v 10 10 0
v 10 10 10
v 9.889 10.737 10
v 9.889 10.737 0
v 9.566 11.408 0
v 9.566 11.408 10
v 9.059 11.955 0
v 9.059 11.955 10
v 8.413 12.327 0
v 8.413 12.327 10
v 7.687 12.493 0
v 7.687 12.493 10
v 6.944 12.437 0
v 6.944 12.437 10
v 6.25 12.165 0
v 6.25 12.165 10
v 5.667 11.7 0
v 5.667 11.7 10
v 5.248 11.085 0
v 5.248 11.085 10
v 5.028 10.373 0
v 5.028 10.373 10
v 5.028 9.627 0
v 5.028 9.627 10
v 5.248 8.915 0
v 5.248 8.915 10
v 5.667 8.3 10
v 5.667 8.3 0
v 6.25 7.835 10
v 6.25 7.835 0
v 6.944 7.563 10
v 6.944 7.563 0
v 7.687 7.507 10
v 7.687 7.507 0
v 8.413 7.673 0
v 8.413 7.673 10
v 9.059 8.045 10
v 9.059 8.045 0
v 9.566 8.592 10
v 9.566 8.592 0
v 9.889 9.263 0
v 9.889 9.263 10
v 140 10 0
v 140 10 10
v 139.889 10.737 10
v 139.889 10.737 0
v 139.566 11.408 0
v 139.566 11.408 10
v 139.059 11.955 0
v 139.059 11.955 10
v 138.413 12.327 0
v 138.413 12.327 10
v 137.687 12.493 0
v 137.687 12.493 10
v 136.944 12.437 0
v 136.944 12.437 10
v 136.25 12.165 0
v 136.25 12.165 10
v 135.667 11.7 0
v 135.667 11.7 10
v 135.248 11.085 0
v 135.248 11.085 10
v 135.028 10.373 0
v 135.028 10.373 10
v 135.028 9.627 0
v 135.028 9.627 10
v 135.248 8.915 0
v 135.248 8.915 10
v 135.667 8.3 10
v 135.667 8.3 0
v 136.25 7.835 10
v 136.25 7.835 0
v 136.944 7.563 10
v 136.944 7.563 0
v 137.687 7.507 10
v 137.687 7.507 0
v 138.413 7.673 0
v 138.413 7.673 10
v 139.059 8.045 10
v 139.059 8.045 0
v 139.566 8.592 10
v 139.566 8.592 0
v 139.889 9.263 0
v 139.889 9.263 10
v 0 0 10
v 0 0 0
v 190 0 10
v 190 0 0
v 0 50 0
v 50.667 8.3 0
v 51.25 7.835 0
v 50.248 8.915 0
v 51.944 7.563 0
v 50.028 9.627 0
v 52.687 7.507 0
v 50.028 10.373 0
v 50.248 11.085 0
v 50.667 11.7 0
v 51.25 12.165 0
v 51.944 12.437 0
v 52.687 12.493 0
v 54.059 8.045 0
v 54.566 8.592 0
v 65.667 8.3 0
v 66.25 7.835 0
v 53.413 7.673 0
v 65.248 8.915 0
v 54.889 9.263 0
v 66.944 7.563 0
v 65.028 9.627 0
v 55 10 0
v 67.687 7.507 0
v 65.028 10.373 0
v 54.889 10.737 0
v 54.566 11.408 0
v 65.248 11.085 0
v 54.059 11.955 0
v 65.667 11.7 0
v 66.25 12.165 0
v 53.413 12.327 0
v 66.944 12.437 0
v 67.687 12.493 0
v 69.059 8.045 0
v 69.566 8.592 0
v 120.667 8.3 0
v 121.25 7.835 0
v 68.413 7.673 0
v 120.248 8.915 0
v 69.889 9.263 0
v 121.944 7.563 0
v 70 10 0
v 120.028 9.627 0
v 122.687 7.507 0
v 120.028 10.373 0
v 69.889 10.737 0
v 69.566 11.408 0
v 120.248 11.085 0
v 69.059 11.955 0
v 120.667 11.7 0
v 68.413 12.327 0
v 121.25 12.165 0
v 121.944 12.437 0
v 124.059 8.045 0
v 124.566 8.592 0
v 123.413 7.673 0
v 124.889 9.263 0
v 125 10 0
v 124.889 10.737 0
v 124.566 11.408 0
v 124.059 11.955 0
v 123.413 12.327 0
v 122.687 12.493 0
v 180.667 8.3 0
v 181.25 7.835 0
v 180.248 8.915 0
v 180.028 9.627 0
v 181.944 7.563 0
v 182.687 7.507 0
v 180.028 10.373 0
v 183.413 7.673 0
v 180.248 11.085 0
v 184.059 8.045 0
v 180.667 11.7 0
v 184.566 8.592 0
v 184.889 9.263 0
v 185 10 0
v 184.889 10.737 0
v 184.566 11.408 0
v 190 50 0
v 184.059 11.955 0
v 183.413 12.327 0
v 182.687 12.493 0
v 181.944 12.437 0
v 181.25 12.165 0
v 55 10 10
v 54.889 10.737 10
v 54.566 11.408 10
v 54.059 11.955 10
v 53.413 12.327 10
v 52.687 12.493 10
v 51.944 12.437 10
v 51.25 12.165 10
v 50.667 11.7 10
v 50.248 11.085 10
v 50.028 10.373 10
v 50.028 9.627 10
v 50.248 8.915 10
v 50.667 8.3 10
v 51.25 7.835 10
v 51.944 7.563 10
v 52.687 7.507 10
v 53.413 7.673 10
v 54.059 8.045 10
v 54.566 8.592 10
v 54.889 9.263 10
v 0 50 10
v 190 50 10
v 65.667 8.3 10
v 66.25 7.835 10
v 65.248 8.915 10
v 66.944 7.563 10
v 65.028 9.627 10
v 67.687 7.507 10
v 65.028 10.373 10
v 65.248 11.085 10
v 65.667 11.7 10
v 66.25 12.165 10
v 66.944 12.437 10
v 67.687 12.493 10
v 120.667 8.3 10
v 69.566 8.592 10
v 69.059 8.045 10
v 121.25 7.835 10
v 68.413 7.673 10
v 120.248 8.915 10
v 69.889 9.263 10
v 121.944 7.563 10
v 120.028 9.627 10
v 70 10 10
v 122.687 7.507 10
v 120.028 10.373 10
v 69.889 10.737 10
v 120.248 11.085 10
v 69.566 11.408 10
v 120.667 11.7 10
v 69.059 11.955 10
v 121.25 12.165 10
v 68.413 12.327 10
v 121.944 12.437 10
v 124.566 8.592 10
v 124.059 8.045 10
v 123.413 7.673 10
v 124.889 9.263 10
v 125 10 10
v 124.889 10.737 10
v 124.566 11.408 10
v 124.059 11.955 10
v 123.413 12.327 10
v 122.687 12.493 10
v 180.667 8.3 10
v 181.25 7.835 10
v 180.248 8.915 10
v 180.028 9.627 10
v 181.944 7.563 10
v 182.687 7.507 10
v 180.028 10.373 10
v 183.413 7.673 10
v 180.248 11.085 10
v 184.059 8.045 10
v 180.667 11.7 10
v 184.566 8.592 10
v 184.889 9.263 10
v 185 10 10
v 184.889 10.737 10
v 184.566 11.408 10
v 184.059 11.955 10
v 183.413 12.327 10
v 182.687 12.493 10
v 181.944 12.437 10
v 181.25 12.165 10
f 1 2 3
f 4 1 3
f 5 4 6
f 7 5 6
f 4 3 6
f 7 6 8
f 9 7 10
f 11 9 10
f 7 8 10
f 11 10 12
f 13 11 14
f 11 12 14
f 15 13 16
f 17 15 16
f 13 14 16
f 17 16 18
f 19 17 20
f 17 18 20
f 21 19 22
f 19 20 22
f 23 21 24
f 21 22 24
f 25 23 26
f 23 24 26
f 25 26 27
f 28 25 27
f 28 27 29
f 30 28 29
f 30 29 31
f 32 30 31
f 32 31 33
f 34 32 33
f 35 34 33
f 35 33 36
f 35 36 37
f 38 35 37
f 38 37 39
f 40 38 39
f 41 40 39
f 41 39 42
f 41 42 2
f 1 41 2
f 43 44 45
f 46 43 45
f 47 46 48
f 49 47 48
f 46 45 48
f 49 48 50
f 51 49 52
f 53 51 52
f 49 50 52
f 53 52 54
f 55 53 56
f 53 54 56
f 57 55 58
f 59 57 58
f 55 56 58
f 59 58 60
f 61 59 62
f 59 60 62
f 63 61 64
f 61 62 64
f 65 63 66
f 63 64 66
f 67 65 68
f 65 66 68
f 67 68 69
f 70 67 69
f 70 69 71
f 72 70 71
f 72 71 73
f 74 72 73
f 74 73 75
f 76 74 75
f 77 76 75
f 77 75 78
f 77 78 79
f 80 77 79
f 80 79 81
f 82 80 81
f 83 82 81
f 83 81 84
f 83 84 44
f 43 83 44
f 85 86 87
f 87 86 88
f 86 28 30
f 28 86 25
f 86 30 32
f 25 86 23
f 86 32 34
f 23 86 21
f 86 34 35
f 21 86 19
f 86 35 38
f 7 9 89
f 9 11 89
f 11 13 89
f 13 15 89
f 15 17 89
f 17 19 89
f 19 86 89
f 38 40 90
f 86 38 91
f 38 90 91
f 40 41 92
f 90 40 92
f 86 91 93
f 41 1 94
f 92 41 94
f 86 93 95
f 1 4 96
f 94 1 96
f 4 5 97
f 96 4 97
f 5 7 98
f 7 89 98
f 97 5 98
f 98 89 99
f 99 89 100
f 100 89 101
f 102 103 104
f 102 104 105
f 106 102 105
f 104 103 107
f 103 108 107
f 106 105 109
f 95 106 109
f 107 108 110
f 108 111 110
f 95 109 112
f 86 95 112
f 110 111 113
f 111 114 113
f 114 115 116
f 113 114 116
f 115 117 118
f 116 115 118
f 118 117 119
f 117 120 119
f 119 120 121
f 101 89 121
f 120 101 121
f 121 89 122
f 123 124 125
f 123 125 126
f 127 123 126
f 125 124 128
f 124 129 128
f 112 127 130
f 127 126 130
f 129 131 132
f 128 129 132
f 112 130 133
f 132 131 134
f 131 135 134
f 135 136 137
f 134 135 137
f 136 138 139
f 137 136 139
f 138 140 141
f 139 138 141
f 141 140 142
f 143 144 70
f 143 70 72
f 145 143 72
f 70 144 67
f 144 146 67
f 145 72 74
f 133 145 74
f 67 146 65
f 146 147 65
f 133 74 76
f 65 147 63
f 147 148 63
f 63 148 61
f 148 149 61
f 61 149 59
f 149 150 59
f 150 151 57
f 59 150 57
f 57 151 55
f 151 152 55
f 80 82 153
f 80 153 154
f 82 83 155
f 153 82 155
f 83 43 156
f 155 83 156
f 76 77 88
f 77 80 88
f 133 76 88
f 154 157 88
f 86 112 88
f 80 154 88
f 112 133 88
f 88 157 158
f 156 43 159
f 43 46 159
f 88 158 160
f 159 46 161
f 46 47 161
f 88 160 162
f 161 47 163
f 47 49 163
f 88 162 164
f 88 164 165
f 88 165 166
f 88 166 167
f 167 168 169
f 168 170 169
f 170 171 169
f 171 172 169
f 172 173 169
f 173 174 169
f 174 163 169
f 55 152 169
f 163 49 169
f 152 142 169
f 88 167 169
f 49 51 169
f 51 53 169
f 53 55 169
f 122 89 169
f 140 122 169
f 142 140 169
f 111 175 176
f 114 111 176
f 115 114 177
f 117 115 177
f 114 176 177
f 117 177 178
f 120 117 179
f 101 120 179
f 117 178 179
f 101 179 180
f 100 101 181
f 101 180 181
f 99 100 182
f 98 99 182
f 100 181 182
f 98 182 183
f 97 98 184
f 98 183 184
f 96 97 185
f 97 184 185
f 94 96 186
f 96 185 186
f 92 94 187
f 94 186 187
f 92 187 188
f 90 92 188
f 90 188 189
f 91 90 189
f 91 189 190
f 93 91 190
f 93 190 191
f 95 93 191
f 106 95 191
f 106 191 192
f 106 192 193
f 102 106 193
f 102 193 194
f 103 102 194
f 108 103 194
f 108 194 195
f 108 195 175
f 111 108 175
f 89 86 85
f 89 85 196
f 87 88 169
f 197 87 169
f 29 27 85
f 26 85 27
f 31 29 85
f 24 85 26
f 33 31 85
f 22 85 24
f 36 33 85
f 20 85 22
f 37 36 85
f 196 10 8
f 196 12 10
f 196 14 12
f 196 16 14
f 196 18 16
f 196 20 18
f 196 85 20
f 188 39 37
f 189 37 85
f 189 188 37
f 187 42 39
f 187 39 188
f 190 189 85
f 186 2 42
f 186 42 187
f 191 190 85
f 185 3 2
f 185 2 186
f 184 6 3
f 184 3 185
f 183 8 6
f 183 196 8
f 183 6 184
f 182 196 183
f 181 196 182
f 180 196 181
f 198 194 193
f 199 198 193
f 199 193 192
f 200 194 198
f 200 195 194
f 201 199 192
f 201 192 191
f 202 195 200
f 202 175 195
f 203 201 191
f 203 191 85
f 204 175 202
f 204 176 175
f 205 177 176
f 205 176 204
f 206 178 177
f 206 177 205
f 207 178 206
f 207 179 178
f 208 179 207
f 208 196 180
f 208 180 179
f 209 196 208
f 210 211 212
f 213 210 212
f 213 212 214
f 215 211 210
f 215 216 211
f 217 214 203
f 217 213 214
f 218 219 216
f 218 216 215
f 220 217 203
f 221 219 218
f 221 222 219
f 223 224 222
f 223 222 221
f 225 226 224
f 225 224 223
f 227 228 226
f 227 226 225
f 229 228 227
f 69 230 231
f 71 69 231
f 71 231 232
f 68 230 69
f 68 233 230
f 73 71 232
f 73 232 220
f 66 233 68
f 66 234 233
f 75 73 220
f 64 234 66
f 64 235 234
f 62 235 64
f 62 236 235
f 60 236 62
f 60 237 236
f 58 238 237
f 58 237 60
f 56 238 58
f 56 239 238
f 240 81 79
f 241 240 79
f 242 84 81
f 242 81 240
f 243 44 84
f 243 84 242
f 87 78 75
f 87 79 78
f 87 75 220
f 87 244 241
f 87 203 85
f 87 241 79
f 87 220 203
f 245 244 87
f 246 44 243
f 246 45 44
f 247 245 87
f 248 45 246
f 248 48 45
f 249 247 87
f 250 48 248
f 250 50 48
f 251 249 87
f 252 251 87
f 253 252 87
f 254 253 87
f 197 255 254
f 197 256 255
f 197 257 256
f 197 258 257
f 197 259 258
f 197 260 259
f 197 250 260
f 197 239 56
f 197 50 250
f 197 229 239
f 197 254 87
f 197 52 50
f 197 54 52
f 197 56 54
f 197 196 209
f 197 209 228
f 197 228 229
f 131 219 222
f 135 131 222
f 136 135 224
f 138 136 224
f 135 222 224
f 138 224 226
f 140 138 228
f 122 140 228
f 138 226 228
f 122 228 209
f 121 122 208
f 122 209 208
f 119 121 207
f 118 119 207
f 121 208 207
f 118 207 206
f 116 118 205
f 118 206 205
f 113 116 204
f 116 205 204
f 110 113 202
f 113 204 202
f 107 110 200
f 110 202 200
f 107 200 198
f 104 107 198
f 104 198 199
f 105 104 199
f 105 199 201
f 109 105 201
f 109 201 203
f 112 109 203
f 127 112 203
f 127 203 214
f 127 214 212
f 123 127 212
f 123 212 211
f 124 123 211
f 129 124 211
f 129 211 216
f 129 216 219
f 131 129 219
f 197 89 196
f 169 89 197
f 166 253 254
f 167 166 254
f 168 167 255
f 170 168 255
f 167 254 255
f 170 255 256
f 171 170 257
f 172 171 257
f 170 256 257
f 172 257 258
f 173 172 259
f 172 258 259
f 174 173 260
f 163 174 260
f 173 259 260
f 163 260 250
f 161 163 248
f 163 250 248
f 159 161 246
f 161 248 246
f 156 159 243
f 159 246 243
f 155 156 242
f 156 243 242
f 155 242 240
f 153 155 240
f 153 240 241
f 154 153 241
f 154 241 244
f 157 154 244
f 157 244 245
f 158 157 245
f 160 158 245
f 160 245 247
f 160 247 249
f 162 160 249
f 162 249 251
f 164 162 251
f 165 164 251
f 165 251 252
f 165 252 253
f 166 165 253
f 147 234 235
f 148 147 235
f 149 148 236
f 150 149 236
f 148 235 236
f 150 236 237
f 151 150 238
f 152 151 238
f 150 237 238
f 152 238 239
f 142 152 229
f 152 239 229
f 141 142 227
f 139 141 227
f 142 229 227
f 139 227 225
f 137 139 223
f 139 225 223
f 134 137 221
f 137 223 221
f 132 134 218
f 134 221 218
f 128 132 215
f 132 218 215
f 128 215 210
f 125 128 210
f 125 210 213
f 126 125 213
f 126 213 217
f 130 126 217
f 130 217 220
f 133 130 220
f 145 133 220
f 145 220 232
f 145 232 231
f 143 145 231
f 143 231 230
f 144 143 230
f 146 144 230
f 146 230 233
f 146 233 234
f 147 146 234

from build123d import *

# Parameters (mm, degrees)
SKETCH_W               = 190
SKETCH_H               = 50
PAD_DEPTH              = 10
SKETCH001_R            = 2.5
HOLE_DEPTH             = 10.001
LINEARPATTERN_COUNT    = 2
LINEARPATTERN_PITCH    = 45
LINEARPATTERN001_COUNT = 2
LINEARPATTERN001_PITCH = 60
LINEARPATTERN002_COUNT = 2
LINEARPATTERN002_PITCH = 115
LINEARPATTERN003_COUNT = 2
LINEARPATTERN003_PITCH = 130
LINEARPATTERN004_COUNT = 2
LINEARPATTERN004_PITCH = 175


with BuildPart() as part:
    # Sketch → Pad (new body)
    with BuildSketch(Plane.XY):
        with Locations((95, 25)):
            Rectangle(SKETCH_W, SKETCH_H)
    extrude(amount=PAD_DEPTH)

    # Sketch001 (on Face6 of Pad) → Hole (cut, through all)
    with BuildSketch(Plane.XY.offset(10)):
        with Locations((7.5, 10)):
            Circle(SKETCH001_R)
    hole = extrude(amount=-HOLE_DEPTH, mode=Mode.SUBTRACT)

    # LinearPattern: Hole ×2
    with Locations(*[(i * LINEARPATTERN_PITCH, 0, 0) for i in range(1, LINEARPATTERN_COUNT)]):
        add(hole, mode=Mode.SUBTRACT)

    # LinearPattern001: Hole ×2
    with Locations(*[(i * LINEARPATTERN001_PITCH, 0, 0) for i in range(1, LINEARPATTERN001_COUNT)]):
        add(hole, mode=Mode.SUBTRACT)

    # LinearPattern002: Hole ×2
    with Locations(*[(i * LINEARPATTERN002_PITCH, 0, 0) for i in range(1, LINEARPATTERN002_COUNT)]):
        add(hole, mode=Mode.SUBTRACT)

    # LinearPattern003: Hole ×2
    with Locations(*[(i * LINEARPATTERN003_PITCH, 0, 0) for i in range(1, LINEARPATTERN003_COUNT)]):
        add(hole, mode=Mode.SUBTRACT)

    # LinearPattern004: Hole ×2
    with Locations(*[(i * LINEARPATTERN004_PITCH, 0, 0) for i in range(1, LINEARPATTERN004_COUNT)]):
        add(hole, mode=Mode.SUBTRACT)


solid = part.part
